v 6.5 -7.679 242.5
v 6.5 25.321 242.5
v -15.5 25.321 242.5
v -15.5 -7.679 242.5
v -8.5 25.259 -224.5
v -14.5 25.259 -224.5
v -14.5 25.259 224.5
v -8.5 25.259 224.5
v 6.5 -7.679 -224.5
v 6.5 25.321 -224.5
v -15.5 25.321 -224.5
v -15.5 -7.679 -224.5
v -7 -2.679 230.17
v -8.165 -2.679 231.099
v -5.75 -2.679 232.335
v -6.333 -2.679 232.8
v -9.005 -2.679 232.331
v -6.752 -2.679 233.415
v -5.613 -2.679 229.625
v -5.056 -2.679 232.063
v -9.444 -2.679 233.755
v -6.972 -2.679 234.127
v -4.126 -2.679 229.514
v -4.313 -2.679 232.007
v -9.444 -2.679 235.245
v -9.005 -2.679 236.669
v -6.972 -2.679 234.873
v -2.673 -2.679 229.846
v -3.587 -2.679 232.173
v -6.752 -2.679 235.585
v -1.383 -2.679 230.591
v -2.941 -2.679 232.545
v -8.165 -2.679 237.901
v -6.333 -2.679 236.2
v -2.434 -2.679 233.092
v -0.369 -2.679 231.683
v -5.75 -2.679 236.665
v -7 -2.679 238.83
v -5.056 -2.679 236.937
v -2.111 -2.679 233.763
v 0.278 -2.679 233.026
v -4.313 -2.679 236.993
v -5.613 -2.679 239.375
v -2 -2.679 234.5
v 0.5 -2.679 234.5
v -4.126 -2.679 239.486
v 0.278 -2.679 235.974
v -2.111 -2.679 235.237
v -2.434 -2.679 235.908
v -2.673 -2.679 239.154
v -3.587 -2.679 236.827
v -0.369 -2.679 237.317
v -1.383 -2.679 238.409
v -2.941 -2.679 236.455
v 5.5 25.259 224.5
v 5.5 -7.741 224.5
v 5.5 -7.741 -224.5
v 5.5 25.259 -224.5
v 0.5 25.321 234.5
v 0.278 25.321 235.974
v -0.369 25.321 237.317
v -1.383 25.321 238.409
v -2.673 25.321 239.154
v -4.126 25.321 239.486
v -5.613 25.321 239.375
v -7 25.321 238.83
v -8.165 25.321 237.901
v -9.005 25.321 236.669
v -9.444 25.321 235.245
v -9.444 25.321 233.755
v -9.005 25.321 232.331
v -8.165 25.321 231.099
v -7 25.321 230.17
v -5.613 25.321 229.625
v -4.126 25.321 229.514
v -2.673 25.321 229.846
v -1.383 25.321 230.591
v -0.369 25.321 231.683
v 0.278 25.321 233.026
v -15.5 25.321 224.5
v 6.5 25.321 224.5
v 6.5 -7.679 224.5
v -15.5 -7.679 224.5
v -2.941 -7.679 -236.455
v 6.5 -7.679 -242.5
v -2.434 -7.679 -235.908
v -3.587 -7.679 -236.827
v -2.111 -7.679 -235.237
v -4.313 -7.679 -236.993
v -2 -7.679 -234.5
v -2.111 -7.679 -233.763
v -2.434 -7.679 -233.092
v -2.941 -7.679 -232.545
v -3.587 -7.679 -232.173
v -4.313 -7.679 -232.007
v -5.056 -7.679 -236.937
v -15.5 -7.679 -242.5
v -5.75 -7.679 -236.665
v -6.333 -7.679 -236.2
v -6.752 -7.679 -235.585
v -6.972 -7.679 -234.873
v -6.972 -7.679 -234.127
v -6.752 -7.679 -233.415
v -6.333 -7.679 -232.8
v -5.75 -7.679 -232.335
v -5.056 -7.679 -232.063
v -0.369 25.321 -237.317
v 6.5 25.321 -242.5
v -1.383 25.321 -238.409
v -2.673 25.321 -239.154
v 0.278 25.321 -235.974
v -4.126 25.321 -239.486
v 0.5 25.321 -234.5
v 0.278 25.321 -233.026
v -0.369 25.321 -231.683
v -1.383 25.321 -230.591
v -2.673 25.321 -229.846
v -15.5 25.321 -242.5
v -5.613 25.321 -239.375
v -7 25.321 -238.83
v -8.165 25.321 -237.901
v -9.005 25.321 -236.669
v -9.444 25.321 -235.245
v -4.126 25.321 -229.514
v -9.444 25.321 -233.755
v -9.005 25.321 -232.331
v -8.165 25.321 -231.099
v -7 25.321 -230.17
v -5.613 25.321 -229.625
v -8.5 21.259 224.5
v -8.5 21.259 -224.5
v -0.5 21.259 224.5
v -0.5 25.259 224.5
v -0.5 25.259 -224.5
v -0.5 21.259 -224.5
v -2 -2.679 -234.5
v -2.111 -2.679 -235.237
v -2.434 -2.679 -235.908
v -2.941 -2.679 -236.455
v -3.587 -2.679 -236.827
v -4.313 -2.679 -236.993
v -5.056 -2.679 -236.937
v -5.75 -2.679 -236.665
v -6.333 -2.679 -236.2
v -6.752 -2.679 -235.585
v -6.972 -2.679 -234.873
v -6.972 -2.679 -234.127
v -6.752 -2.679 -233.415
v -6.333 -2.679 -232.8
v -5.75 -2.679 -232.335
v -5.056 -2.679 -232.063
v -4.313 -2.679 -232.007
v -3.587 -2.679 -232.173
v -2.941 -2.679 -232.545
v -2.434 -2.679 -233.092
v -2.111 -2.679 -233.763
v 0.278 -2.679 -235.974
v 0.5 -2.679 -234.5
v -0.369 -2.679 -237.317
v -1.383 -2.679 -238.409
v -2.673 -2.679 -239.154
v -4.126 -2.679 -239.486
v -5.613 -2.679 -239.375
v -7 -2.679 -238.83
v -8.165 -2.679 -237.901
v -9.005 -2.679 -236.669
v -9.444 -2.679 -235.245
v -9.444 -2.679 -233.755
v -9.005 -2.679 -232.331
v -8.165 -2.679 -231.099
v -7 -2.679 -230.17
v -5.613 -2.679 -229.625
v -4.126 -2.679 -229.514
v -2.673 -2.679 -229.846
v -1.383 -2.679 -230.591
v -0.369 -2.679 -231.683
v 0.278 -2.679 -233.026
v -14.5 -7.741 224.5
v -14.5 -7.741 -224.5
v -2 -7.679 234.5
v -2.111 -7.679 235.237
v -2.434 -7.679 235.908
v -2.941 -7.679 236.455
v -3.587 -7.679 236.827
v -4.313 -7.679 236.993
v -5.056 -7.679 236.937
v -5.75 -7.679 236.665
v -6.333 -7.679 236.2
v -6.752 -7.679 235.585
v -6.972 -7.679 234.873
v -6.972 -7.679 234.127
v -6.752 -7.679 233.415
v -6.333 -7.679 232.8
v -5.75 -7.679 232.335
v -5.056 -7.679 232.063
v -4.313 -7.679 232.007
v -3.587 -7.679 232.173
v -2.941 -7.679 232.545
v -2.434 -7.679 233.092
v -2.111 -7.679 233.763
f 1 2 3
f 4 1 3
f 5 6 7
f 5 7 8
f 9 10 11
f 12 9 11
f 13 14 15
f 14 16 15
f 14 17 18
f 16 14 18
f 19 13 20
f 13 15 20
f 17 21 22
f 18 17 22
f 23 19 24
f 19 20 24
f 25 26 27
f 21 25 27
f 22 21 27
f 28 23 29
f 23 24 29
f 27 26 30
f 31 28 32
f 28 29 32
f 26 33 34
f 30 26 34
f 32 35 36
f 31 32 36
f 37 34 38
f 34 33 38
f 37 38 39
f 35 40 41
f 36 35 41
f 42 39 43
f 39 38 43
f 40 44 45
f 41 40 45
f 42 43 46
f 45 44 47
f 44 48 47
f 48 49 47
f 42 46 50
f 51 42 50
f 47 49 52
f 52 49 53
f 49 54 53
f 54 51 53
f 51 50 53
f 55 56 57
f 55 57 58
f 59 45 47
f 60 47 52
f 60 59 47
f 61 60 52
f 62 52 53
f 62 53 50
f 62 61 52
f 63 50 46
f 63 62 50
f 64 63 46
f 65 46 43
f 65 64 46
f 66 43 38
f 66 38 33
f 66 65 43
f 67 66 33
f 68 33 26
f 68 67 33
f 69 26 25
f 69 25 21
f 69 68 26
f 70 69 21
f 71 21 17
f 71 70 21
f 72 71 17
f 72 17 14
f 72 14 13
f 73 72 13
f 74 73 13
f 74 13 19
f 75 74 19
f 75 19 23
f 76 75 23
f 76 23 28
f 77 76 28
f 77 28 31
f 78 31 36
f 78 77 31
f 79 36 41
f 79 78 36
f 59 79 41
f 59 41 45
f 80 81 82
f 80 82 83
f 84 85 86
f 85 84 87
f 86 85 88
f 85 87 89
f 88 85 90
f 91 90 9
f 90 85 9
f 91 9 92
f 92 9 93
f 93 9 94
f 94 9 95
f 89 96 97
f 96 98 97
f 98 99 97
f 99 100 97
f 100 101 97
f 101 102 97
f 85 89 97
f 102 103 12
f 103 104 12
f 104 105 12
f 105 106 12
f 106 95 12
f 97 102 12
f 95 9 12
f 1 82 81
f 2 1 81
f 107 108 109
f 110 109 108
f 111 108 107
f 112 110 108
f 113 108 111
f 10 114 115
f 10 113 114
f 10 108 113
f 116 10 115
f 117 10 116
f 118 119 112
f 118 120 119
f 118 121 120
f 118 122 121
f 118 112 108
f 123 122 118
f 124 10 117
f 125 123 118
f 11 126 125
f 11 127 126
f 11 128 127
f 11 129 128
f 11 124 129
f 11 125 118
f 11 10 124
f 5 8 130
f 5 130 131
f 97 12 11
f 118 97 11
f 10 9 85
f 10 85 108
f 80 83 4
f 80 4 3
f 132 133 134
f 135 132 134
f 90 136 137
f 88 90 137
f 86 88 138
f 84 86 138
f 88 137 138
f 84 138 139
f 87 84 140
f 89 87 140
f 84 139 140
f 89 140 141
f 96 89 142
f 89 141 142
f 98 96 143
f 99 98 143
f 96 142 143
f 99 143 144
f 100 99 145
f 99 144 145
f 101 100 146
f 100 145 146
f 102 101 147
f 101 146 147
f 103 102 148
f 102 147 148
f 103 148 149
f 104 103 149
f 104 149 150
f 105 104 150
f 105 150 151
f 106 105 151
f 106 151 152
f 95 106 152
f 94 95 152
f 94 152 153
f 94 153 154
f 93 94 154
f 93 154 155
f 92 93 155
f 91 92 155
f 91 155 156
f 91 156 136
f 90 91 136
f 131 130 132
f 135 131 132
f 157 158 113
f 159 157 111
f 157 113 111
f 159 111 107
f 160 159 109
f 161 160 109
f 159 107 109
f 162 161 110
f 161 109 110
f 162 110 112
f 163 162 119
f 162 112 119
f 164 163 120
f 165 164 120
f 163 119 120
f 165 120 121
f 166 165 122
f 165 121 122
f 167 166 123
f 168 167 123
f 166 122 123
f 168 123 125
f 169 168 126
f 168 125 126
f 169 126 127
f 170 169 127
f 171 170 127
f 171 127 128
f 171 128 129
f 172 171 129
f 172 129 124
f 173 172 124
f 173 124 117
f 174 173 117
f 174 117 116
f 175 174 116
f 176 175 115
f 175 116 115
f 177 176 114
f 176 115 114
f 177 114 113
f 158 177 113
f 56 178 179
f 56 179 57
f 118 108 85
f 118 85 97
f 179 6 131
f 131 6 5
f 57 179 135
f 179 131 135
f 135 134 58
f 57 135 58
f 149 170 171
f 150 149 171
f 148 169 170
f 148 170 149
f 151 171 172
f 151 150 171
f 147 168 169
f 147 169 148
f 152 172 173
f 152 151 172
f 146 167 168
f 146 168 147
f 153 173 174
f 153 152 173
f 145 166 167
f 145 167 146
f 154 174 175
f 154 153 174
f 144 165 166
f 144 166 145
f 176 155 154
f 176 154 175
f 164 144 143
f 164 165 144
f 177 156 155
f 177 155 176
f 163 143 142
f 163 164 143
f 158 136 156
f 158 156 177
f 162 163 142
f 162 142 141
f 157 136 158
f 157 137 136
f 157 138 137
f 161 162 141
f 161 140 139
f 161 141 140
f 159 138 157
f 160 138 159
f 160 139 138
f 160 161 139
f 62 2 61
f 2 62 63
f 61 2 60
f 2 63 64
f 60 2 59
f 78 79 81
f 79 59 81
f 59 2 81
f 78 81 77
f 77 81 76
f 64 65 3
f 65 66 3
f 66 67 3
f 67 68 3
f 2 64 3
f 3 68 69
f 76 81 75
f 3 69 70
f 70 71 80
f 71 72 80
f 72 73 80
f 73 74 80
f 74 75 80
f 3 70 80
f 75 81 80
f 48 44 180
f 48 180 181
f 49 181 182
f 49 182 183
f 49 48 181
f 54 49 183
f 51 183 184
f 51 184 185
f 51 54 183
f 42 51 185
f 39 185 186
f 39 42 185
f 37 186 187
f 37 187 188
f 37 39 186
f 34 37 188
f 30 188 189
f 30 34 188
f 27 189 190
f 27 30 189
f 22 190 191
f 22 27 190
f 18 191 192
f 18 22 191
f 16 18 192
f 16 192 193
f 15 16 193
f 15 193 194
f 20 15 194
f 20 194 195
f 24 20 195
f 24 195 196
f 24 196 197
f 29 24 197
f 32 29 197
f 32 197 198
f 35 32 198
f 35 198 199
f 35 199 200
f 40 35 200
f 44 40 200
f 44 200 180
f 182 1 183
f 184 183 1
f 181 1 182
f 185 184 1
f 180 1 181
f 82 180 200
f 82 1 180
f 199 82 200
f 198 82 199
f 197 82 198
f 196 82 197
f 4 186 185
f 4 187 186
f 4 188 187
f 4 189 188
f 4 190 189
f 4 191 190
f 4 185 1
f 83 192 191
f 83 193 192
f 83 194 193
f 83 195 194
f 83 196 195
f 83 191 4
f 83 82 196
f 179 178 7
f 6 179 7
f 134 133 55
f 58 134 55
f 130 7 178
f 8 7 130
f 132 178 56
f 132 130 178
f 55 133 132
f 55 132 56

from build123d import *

# Parameters (mm, degrees)
BOSS_EXTRUDE1_DEPTH      = 224.5
BOSS_EXTRUDE1_DEPTH_BACK = 224.5
SKETCH1_W                = 20
SKETCH1_H                = 33
SKETCH18_W               = 8
SKETCH18_H               = 449
CUT_EXTRUDE6_DEPTH       = 4
SKETCH19_W               = 22
SKETCH19_H               = 33
BOSS_EXTRUDE5_DEPTH      = 18
SKETCH20_R               = 2.5
CUT_EXTRUDE7_DEPTH       = 246.233707055
SKETCH20_4_R             = 5
SKETCH20_4_R_2           = 2.5
CUT_EXTRUDE8_DEPTH       = 28


with BuildPart() as part:
    # Sketch1 → Boss-Extrude1 (new, two sides: drawn at the far end of the back side and taken through both)
    with BuildSketch(Plane.XY.offset(-BOSS_EXTRUDE1_DEPTH_BACK)):
        with Locations((-4.5, 8.759259259)):
            Rectangle(SKETCH1_W, SKETCH1_H)
    extrude(amount=BOSS_EXTRUDE1_DEPTH + BOSS_EXTRUDE1_DEPTH_BACK)

    # Sketch18 → Cut-Extrude6 (cut)
    with BuildSketch(Plane(origin=(0, 25.259259259, 0), x_dir=(1, 0, 0), z_dir=(0, 1, 0))):
        with Locations((-4.5, 0)):
            Rectangle(SKETCH18_W, SKETCH18_H)
    extrude(amount=-CUT_EXTRUDE6_DEPTH, mode=Mode.SUBTRACT)


with BuildPart() as body_2:
    # Sketch19 → Boss-Extrude5 (new body)
    with BuildSketch(Plane(origin=(0, 0, -224.5), x_dir=(-1, 0, 0), z_dir=(0, 0, -1))):
        with Locations((4.5, 8.82088469)):
            Rectangle(SKETCH19_W, SKETCH19_H)
    extrude(amount=BOSS_EXTRUDE5_DEPTH)

    # Sketch20 → Cut-Extrude7 (cut, through all)
    with BuildSketch(Plane(origin=(0, 25.32088469, 0), x_dir=(1, 0, 0), z_dir=(0, 1, 0))):
        with Locations((-4.5, 234.5)):
            Circle(SKETCH20_R)
    extrude(amount=-CUT_EXTRUDE7_DEPTH, mode=Mode.SUBTRACT)

    # Sketch20_4 → Cut-Extrude8 (cut)
    with BuildSketch(Plane(origin=(0, 25.32088469, 0), x_dir=(1, 0, 0), z_dir=(0, 1, 0))):
        with Locations((-4.5, 234.5)):
            Circle(SKETCH20_4_R)
        with Locations((-4.5, 234.5)):
            Circle(SKETCH20_4_R_2, mode=Mode.SUBTRACT)
    extrude(amount=-CUT_EXTRUDE8_DEPTH, mode=Mode.SUBTRACT)


with BuildPart() as body_3:
    # Mirror8: mirrored copy
    add(body_2.part.mirror(Plane(origin=(0, 0, 0), x_dir=(1, 0, 0), z_dir=(0, 0, -1))))


solid = Compound([part.part, body_2.part, body_3.part])
